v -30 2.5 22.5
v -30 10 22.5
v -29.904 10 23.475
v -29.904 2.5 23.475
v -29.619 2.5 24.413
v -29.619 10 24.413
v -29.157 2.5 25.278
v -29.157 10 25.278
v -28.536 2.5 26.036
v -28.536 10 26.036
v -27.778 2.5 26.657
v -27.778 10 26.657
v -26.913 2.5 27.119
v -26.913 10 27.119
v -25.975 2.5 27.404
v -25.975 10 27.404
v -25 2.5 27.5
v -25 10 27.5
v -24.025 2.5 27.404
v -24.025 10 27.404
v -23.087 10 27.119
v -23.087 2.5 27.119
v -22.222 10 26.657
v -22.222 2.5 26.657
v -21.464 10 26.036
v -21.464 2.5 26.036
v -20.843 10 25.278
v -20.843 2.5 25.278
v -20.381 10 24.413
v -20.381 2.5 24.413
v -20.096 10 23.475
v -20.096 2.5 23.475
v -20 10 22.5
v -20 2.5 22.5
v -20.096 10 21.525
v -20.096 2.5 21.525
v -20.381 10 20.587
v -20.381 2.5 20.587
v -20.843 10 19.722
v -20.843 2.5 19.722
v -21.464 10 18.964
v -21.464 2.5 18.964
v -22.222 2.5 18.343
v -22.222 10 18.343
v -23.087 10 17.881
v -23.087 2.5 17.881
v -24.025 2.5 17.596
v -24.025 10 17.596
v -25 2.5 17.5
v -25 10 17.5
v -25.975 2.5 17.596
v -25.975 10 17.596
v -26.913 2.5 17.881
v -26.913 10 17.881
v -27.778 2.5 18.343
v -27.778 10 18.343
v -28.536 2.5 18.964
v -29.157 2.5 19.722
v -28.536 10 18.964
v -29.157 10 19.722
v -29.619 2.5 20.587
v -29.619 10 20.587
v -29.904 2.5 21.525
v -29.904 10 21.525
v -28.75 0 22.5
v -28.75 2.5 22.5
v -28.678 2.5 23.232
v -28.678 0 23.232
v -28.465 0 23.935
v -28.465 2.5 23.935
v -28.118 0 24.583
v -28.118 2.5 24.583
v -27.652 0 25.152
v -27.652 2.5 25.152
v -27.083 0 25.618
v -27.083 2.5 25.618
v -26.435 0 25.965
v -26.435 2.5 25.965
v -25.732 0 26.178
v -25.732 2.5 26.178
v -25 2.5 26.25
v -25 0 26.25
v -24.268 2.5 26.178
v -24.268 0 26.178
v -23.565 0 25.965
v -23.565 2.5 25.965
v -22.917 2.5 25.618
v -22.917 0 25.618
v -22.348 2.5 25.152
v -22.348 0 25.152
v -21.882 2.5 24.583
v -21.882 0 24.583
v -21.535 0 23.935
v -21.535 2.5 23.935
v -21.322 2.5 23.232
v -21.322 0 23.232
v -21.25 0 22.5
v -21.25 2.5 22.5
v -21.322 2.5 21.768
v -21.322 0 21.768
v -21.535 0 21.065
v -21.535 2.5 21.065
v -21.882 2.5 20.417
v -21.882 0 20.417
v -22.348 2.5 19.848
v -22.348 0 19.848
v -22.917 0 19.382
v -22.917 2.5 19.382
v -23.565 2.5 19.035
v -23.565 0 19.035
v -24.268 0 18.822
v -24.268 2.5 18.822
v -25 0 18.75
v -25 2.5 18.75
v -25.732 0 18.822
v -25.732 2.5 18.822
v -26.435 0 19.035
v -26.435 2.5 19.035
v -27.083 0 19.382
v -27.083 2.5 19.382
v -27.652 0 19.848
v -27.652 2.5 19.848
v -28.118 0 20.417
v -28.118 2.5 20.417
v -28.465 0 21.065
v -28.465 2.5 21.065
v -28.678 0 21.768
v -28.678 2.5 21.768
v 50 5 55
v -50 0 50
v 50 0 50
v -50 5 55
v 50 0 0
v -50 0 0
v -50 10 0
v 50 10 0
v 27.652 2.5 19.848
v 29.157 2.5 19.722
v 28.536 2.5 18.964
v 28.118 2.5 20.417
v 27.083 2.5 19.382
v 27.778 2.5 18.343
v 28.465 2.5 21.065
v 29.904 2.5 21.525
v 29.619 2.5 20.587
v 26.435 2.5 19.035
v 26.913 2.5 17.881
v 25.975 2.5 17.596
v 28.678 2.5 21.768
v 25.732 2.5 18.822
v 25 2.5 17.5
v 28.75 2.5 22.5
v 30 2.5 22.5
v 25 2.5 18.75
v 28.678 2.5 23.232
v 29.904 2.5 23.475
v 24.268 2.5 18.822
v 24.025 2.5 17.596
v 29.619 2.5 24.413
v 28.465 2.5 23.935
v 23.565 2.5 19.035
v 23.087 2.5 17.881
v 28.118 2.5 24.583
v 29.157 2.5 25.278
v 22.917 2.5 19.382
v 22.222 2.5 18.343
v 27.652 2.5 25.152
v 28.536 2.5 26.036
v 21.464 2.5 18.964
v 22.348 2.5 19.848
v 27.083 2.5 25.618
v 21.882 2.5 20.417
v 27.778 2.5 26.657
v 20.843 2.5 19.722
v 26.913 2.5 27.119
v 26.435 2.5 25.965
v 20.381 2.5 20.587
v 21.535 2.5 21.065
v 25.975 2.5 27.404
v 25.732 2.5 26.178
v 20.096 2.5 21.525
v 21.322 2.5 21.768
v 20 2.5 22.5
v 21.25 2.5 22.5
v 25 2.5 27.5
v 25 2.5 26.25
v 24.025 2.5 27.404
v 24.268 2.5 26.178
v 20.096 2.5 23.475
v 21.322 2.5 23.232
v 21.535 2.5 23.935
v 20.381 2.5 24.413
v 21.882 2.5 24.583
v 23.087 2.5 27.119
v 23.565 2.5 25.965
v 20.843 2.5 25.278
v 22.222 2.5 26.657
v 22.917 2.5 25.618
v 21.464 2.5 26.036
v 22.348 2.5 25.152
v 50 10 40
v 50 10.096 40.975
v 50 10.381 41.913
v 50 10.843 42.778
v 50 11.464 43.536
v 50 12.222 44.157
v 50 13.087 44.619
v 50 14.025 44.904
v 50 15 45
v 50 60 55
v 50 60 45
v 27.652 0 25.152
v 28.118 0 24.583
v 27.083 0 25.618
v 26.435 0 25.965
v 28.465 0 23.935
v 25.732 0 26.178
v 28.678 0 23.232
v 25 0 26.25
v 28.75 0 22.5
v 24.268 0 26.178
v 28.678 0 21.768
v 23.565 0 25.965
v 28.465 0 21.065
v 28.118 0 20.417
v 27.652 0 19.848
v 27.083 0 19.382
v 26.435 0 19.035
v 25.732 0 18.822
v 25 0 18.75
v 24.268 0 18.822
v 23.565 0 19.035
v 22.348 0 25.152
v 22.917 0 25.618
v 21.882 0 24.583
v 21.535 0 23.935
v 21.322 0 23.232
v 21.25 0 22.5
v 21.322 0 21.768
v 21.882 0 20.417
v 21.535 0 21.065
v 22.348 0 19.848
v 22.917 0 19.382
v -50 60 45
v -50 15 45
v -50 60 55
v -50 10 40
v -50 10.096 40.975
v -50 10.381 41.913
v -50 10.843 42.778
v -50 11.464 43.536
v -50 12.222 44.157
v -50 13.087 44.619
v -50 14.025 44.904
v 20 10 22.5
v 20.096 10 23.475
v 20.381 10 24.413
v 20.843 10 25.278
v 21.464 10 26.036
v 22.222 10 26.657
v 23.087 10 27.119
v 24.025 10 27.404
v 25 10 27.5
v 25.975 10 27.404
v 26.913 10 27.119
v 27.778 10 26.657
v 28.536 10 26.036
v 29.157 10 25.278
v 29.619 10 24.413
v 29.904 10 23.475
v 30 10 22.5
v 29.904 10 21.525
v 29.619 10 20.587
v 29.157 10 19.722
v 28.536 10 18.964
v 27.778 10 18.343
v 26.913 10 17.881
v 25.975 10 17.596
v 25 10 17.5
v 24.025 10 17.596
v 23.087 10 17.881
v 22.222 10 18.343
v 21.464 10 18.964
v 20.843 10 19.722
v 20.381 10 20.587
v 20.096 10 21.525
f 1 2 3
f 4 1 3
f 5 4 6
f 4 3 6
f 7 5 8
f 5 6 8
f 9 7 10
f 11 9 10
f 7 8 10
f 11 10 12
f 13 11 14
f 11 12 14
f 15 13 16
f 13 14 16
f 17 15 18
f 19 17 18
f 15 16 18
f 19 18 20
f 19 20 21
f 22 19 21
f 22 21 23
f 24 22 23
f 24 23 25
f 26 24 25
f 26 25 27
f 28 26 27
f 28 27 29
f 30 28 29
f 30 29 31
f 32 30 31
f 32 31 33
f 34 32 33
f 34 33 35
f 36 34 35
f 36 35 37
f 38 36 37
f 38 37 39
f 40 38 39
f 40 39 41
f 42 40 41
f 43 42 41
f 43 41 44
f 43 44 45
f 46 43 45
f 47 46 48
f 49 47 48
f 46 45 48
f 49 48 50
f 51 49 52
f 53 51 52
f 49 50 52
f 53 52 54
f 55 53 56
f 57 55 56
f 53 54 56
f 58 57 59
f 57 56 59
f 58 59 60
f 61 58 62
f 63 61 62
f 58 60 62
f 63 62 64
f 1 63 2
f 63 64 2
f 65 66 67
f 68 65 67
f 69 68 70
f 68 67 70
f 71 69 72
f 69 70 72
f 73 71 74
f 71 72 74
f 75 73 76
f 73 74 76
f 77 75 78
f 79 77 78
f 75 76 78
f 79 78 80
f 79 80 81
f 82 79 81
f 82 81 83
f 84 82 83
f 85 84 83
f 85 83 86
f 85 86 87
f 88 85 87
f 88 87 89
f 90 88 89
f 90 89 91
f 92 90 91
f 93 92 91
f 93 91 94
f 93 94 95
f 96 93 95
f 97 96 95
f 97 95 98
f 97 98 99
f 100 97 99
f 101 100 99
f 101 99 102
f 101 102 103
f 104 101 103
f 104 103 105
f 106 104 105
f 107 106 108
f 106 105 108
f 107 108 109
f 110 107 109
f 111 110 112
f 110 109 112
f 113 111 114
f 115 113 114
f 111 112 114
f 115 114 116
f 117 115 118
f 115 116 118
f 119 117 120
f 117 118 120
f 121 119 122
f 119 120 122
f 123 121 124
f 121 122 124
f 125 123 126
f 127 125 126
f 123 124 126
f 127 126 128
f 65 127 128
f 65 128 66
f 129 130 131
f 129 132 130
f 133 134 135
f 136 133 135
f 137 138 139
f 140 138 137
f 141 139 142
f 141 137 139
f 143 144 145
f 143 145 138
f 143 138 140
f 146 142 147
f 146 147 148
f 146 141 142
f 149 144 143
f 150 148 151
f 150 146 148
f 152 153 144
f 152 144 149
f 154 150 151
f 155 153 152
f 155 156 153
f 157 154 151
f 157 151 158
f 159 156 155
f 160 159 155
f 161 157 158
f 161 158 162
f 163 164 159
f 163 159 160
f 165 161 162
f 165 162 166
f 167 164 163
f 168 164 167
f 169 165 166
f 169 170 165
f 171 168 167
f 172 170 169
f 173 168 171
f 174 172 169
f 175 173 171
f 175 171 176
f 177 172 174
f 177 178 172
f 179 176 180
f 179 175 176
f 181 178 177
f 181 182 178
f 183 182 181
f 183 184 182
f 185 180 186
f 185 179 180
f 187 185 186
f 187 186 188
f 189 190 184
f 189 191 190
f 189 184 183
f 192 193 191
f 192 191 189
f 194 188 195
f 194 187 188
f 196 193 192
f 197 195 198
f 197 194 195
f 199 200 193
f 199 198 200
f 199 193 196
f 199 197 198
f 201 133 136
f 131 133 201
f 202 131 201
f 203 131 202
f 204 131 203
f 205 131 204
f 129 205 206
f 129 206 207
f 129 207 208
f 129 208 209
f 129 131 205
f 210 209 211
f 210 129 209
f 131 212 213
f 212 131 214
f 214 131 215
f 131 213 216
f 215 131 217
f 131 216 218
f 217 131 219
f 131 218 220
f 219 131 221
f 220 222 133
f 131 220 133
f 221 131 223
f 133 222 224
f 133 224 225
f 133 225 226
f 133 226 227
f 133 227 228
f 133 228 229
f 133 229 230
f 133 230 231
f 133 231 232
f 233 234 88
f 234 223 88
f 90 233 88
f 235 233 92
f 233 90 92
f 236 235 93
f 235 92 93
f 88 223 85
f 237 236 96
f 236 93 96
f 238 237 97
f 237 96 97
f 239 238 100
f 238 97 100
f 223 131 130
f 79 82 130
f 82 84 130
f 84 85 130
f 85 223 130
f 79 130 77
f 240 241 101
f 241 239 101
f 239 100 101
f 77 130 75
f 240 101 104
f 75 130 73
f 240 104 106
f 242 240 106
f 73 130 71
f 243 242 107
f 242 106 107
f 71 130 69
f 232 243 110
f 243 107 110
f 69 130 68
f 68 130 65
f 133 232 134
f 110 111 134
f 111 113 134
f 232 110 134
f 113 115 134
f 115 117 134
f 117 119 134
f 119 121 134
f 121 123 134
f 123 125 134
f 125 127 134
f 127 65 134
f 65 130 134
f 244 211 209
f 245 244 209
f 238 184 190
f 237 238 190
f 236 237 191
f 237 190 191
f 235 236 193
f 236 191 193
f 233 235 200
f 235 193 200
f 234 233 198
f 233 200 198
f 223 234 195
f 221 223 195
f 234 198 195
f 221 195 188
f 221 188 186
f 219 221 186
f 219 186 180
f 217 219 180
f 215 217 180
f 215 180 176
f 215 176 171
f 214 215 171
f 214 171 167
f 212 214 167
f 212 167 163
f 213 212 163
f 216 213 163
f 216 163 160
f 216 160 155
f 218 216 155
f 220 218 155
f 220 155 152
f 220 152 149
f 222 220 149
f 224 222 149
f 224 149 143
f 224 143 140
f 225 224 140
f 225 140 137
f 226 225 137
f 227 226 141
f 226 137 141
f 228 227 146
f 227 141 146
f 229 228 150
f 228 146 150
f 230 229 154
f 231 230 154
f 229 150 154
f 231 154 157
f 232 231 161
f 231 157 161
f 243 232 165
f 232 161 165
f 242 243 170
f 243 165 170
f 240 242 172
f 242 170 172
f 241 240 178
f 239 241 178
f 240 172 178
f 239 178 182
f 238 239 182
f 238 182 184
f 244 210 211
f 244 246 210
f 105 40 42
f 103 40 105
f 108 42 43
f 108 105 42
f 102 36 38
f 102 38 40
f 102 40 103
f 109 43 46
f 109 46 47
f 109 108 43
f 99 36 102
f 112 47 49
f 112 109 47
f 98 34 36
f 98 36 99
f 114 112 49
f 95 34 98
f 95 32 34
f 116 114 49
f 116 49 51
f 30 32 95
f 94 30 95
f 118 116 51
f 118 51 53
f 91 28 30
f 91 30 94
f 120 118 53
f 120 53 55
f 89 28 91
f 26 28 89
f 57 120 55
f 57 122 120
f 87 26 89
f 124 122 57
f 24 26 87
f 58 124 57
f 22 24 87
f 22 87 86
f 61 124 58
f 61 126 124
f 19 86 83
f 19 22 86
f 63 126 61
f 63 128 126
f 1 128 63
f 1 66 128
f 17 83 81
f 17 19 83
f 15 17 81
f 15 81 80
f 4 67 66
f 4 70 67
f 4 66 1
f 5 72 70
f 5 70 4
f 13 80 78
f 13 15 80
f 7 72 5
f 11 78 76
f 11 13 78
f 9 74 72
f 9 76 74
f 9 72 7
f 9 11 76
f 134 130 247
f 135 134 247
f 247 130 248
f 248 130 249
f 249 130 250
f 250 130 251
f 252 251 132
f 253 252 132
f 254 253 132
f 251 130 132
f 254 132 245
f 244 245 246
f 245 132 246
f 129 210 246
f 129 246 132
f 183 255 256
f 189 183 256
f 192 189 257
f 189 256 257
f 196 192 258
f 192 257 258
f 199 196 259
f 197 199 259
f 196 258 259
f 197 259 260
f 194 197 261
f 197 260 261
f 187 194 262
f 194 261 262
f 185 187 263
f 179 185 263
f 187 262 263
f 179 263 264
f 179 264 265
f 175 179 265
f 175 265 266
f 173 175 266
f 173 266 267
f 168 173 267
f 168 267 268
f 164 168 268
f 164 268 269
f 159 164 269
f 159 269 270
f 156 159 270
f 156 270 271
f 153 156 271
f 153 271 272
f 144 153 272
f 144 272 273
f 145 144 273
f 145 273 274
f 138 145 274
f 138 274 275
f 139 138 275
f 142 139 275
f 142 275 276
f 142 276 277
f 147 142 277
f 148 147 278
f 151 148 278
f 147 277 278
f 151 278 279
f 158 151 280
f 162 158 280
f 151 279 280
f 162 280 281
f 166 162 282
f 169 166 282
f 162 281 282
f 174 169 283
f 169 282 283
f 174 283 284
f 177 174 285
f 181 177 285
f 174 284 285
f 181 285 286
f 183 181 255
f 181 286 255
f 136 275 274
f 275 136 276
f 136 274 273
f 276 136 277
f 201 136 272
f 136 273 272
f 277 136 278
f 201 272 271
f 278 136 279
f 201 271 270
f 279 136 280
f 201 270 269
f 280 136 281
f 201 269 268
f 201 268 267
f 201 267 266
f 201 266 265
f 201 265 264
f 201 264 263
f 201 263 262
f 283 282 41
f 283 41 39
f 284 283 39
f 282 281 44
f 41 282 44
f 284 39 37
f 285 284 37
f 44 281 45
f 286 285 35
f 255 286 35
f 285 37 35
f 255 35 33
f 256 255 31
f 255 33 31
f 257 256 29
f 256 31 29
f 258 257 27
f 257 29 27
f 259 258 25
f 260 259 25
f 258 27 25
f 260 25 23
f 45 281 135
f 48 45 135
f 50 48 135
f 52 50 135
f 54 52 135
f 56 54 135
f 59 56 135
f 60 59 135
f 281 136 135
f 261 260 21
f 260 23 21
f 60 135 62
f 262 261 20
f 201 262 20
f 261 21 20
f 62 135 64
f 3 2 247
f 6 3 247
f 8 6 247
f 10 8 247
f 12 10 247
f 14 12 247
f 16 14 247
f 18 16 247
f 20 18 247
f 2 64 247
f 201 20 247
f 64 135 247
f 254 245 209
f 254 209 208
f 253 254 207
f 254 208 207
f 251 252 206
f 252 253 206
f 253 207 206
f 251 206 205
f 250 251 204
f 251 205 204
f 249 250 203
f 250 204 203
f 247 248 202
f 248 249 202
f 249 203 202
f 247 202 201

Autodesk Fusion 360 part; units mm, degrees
sketch "Sketch1" plane through (0, 0, 0) normal (1, 0, 0) x (0, 1, 0)
  line L0 (0, 0) -> (10, 0)
  line L1 (10, 0) -> (10, 45)
  line L2 (10, 55) -> (0, 55)
  line L3 (0, 55) -> (0, 0)
  line L4 (0, 55) -> (60, 55)
  line L5 (60, 55) -> (60, 45)
  line L6 (60, 45) -> (10, 45)
  line L7 (0, 45) -> (0, 55)
extrude "Extrude1" add sketch "Sketch1" along normal mid plane 100
sketch "Sketch2" plane through (0, 10, 0) normal (0, 1, 0) x (-1, 0, 0)
  line L0 (50, 45) -> (-50, 45)
  line L1 (-50, 45) -> (-50, 0)
  line L2 (-50, 0) -> (50, 0)
  line L3 (50, 0) -> (50, 45)
  circle A0 centre (25, 22.5) radius 3.75
  line L4 (0, 0) -> (0, 67.2521)
  circle A1 centre (-25, 22.5) radius 3.75
  dimension "d3" = 7.5
  dimension "d4" = 25
extrude "Extrude2" cut sketch "Sketch2" against normal blind 28 contours A0 | A1
sketch "Sketch3" plane through (0, 10, 0) normal (0, 1, 0) x (-1, 0, 0)
  circle A0 centre (-25, 22.5) radius 3.75
  circle A1 centre (25, 22.5) radius 3.75
  line L0 (50, 45) -> (-50, 45)
  line L1 (-50, 45) -> (-50, 0)
  line L2 (-50, 0) -> (50, 0)
  line L3 (50, 0) -> (50, 45)
  circle A2 centre (-25, 22.5) radius 5
  circle A3 centre (25, 22.5) radius 5
  dimension "d7" = 10
  dimension "d8" = 10
extrude "Extrude3" cut sketch "Sketch3" against normal blind 7.5 contours A2 | A3
fillet "Fillet1" radius 5 1 edges at (0, 10, 45)
chamfer "Chamfer1" distance 5 angle 45 1 edges at (0, 0, 55)
